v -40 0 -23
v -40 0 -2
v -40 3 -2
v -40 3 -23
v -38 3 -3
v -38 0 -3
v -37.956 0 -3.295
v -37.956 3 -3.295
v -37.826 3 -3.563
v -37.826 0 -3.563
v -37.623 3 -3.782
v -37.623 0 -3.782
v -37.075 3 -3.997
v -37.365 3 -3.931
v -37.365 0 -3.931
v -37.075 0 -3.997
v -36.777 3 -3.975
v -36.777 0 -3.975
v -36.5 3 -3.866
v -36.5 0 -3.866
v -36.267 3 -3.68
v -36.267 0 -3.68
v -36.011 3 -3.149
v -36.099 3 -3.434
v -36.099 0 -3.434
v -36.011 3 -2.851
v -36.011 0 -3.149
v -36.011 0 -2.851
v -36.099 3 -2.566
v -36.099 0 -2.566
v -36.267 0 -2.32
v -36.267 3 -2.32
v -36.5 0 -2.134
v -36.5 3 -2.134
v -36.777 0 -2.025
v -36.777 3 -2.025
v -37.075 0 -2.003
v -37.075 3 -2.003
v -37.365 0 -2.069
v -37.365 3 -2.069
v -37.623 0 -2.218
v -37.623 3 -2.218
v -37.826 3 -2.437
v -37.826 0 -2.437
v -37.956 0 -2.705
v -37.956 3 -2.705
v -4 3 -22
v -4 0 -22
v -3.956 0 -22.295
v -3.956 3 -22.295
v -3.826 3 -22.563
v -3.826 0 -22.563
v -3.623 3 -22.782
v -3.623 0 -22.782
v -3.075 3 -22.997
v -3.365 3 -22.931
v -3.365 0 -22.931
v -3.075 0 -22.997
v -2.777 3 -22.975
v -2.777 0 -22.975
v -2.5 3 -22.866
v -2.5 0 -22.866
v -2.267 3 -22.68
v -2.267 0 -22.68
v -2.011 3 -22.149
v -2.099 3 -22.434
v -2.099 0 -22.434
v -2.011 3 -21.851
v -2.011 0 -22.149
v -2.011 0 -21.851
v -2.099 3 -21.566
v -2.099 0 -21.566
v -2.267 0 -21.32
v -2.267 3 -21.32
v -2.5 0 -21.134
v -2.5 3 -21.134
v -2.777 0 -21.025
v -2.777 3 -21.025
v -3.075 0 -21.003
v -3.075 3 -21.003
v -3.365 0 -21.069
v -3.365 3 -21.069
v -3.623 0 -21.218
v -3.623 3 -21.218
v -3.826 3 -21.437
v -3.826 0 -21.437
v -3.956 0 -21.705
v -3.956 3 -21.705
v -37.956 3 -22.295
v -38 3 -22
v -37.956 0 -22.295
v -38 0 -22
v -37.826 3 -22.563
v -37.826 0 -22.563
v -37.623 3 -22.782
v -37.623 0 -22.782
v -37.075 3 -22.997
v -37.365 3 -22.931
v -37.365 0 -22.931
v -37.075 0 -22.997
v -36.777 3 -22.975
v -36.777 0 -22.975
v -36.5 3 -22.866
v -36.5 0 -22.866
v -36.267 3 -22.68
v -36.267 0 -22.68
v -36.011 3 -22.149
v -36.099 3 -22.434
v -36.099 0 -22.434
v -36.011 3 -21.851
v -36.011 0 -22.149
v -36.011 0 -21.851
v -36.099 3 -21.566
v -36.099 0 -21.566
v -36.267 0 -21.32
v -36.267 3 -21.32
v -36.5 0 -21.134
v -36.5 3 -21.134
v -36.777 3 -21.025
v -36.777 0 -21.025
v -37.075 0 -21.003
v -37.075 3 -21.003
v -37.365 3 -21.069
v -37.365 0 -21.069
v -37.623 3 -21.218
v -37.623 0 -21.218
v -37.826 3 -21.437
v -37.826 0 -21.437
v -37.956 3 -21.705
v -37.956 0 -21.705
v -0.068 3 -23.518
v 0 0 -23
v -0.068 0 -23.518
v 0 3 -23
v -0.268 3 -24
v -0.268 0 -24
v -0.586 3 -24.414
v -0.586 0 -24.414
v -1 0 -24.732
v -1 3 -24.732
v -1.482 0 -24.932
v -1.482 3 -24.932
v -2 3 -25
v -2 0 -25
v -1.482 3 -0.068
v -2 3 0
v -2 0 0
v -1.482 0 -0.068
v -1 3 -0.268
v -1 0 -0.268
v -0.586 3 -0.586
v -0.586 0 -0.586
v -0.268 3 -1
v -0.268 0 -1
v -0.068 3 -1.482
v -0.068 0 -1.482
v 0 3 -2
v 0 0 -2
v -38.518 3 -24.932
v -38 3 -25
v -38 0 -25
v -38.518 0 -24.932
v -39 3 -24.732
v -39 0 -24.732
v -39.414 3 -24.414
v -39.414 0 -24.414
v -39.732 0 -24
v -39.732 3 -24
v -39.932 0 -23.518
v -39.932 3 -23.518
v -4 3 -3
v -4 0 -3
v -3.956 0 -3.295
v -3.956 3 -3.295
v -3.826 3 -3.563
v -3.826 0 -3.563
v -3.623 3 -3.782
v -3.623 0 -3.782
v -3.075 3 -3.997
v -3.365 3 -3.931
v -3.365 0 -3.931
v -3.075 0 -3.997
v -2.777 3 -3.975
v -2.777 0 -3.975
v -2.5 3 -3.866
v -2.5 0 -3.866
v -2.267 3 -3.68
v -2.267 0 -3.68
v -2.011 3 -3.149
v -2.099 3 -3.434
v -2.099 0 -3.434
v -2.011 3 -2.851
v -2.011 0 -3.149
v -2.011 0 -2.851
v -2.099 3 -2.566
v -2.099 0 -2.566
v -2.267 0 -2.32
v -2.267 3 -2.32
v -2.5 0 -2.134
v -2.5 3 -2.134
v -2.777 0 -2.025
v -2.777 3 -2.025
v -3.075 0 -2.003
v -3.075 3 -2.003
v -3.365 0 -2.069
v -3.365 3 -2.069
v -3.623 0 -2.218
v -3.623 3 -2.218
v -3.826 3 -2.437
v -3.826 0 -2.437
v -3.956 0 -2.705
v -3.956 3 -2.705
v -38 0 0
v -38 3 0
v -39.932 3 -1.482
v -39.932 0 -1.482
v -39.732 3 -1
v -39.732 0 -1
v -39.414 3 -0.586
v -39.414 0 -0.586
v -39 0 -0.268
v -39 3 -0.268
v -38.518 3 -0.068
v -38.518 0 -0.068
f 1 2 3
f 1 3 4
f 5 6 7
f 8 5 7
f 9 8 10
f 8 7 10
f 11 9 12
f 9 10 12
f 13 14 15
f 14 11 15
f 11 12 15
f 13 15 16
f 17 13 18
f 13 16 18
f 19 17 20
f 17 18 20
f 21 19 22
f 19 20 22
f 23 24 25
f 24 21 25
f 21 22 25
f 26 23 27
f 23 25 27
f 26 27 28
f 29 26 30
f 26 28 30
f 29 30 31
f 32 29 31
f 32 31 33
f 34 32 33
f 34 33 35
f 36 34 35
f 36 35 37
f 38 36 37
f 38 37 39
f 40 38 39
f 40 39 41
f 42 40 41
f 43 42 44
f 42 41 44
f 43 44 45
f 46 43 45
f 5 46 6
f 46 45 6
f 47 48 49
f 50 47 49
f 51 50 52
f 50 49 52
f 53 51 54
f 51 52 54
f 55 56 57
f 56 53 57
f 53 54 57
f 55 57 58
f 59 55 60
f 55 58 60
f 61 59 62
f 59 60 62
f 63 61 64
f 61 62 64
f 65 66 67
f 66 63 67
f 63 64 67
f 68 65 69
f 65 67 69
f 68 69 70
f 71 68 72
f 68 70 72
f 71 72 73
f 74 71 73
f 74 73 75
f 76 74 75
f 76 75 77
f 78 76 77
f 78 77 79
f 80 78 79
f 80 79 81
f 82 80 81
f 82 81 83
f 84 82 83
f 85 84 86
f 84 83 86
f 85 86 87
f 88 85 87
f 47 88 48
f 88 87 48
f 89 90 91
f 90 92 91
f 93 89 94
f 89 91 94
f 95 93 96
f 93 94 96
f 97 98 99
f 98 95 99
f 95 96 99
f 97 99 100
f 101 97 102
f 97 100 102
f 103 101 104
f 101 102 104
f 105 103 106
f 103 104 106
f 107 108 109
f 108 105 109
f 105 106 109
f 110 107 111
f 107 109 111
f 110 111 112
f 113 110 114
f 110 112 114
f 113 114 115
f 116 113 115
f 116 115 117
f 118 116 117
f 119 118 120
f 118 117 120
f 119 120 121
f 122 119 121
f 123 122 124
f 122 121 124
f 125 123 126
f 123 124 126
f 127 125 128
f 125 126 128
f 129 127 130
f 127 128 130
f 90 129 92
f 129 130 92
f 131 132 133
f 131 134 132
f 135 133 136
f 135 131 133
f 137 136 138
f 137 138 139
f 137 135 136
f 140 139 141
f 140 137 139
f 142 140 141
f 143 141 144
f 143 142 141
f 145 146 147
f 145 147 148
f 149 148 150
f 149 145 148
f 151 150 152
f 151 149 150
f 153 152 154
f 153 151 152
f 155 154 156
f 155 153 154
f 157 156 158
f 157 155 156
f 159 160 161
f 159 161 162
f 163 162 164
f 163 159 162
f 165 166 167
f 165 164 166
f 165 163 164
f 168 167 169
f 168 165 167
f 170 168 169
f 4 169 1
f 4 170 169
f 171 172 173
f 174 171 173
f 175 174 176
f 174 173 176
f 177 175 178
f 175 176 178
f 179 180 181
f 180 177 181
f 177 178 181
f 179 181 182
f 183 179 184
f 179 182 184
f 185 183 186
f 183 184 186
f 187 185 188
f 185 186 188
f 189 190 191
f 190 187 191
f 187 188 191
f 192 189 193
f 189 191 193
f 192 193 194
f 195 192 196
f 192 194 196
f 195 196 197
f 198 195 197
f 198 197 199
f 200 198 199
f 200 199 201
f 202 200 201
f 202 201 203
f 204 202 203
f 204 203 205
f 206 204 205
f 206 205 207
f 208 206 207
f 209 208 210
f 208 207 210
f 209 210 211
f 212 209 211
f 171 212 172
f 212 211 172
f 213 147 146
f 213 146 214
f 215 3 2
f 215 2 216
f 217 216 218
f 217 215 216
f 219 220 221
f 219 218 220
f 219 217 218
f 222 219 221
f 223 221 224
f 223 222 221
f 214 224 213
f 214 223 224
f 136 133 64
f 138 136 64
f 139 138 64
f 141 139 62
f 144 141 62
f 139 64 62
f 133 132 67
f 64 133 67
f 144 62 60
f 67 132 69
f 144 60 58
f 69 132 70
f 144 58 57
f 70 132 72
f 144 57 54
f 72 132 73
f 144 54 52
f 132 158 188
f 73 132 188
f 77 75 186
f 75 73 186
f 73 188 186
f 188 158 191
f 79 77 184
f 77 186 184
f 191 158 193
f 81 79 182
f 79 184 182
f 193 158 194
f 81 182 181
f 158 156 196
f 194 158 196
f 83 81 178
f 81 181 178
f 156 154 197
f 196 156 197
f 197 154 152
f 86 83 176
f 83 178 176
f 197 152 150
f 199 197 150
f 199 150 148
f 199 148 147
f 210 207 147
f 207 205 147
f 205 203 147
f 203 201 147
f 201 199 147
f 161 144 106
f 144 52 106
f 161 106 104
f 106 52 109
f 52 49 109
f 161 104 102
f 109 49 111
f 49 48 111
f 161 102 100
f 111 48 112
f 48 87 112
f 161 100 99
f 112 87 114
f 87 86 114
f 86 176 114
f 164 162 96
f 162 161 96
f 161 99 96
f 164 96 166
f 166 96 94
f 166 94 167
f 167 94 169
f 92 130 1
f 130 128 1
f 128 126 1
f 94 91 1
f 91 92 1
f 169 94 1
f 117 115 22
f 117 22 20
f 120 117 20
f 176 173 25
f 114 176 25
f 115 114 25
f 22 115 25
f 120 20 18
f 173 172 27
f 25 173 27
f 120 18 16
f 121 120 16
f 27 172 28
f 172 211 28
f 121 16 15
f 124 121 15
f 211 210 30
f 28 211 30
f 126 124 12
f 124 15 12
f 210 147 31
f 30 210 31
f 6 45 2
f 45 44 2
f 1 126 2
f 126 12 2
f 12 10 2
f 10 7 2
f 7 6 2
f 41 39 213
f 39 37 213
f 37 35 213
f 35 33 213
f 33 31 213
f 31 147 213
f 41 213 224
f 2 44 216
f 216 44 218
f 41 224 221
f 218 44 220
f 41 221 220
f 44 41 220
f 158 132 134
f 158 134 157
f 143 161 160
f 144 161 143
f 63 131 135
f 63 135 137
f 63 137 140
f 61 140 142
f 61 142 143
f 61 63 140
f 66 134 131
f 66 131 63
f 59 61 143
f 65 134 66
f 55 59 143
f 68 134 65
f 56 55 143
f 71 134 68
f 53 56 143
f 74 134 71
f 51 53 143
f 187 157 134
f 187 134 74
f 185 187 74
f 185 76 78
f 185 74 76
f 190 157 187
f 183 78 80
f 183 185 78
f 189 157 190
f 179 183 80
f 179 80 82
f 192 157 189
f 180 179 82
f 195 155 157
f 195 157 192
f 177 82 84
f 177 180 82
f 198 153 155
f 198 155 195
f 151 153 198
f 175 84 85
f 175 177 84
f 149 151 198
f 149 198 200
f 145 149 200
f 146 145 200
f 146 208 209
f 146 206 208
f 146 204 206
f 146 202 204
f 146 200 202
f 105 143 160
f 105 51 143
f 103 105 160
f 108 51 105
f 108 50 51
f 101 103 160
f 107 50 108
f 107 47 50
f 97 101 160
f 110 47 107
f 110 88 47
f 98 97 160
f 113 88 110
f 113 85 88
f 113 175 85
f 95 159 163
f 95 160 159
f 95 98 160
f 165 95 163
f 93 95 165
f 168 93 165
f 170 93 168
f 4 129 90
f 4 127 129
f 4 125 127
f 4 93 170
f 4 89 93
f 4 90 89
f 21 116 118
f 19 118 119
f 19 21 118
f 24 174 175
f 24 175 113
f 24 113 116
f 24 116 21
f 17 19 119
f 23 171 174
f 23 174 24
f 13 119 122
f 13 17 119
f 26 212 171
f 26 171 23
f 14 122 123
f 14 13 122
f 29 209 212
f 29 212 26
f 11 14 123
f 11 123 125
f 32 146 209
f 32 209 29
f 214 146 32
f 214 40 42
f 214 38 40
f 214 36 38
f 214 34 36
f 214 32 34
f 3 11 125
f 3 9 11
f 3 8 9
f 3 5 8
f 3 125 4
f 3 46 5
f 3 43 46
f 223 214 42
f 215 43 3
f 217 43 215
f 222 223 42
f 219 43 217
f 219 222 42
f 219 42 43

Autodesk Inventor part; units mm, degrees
ref_plane "YZ Plane" through (0, 0, 0) normal (1, 0, 0) x (0, 1, 0)
ref_plane "XZ Plane" through (0, 0, 0) normal (0, 1, 0) x (-1, 0, 0)
ref_plane "XY Plane" through (0, 0, 0) normal (0, 0, 1) x (1, 0, 0)
sketch "Sketch1" plane through (0, 0, 0) normal (0, 1, 0) x (-1, 0, 0)
  line L0 (0, 0) -> (40, 0)
  line L1 (40, 0) -> (40, -25)
  line L2 (40, -25) -> (0, -25)
  line L3 (0, -25) -> (0, 0)
  circle A0 centre (37, -3) radius 1
  line L4 (40, -12.5) -> (0, -12.5)
  line L5 (20, 0) -> (20, -25)
  circle A1 centre (37, -22) radius 1
  circle A2 centre (3, -3) radius 1
  circle A3 centre (3, -22) radius 1
  dimension "d0" = 40
  dimension "d1" = 25
  dimension "d2" = 2
  dimension "d3" = 3
  dimension "d4" = 3
extrude "Extrusion1" add sketch "Sketch1" along normal blind 3
fillet "Fillet1" radius 2 4 edges at (0, 1.5, 0) (0, 1.5, -25) (-40, 1.5, -25) (-40, 1.5, 0)
properties part number "SpojovaciDeska"
